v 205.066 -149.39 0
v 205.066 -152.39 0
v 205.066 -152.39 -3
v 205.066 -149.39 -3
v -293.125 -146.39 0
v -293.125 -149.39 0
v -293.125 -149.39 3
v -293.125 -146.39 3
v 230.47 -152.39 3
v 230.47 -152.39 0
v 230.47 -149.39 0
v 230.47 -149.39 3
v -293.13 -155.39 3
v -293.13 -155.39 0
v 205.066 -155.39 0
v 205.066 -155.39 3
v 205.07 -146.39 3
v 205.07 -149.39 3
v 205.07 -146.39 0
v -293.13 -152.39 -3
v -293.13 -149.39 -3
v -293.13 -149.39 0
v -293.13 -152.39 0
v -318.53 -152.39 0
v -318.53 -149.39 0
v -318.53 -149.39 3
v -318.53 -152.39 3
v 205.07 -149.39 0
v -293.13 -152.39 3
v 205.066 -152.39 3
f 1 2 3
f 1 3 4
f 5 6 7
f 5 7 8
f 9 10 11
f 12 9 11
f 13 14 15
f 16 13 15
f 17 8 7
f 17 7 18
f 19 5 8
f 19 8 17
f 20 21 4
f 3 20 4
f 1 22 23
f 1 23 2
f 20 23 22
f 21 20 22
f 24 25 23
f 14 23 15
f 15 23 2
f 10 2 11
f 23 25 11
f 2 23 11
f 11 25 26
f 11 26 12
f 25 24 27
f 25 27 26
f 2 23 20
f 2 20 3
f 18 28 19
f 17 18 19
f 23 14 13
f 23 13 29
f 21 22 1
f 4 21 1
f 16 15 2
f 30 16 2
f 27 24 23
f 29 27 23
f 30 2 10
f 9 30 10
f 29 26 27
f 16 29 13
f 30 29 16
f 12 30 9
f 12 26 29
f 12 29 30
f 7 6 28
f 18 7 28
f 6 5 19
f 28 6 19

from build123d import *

# Parameters (mm, degrees)
F0_W     = 549
F0_H     = 3
F1_DEPTH = 3
F2_W     = 498.1956
F2_H     = 3
F3_DEPTH = 3
F4_W     = 498.1956
F4_H     = 3
F5_DEPTH = 3
F6_W     = 498.1956
F6_H     = 3
F7_DEPTH = 3


with BuildPart() as f1:
    # F0 (on Top) → F1 (new body)
    with BuildSketch(Plane.XY):
        with Locations((-44.029893, -150.890153)):
            Rectangle(F0_W, F0_H)
    extrude(amount=F1_DEPTH)

    # F2 (on Top) → F3 (join)
    with BuildSketch(Plane.XY):
        with Locations((-44.032093, -153.890153)):
            Rectangle(F2_W, F2_H)
    extrude(amount=F3_DEPTH)


with BuildPart() as f5:
    # F4 (on Top) → F5 (new body)
    with BuildSketch(Plane.XY):
        with Locations((-44.027693, -147.890153)):
            Rectangle(F4_W, F4_H)
    extrude(amount=F5_DEPTH)


with BuildPart() as f7:
    # F6 (on Top) → F7 (new body)
    with BuildSketch(Plane.XY):
        with Locations((-44.032093, -150.890153)):
            Rectangle(F6_W, F6_H)
    extrude(amount=-F7_DEPTH)


solid = Compound([f1.part, f5.part, f7.part])
